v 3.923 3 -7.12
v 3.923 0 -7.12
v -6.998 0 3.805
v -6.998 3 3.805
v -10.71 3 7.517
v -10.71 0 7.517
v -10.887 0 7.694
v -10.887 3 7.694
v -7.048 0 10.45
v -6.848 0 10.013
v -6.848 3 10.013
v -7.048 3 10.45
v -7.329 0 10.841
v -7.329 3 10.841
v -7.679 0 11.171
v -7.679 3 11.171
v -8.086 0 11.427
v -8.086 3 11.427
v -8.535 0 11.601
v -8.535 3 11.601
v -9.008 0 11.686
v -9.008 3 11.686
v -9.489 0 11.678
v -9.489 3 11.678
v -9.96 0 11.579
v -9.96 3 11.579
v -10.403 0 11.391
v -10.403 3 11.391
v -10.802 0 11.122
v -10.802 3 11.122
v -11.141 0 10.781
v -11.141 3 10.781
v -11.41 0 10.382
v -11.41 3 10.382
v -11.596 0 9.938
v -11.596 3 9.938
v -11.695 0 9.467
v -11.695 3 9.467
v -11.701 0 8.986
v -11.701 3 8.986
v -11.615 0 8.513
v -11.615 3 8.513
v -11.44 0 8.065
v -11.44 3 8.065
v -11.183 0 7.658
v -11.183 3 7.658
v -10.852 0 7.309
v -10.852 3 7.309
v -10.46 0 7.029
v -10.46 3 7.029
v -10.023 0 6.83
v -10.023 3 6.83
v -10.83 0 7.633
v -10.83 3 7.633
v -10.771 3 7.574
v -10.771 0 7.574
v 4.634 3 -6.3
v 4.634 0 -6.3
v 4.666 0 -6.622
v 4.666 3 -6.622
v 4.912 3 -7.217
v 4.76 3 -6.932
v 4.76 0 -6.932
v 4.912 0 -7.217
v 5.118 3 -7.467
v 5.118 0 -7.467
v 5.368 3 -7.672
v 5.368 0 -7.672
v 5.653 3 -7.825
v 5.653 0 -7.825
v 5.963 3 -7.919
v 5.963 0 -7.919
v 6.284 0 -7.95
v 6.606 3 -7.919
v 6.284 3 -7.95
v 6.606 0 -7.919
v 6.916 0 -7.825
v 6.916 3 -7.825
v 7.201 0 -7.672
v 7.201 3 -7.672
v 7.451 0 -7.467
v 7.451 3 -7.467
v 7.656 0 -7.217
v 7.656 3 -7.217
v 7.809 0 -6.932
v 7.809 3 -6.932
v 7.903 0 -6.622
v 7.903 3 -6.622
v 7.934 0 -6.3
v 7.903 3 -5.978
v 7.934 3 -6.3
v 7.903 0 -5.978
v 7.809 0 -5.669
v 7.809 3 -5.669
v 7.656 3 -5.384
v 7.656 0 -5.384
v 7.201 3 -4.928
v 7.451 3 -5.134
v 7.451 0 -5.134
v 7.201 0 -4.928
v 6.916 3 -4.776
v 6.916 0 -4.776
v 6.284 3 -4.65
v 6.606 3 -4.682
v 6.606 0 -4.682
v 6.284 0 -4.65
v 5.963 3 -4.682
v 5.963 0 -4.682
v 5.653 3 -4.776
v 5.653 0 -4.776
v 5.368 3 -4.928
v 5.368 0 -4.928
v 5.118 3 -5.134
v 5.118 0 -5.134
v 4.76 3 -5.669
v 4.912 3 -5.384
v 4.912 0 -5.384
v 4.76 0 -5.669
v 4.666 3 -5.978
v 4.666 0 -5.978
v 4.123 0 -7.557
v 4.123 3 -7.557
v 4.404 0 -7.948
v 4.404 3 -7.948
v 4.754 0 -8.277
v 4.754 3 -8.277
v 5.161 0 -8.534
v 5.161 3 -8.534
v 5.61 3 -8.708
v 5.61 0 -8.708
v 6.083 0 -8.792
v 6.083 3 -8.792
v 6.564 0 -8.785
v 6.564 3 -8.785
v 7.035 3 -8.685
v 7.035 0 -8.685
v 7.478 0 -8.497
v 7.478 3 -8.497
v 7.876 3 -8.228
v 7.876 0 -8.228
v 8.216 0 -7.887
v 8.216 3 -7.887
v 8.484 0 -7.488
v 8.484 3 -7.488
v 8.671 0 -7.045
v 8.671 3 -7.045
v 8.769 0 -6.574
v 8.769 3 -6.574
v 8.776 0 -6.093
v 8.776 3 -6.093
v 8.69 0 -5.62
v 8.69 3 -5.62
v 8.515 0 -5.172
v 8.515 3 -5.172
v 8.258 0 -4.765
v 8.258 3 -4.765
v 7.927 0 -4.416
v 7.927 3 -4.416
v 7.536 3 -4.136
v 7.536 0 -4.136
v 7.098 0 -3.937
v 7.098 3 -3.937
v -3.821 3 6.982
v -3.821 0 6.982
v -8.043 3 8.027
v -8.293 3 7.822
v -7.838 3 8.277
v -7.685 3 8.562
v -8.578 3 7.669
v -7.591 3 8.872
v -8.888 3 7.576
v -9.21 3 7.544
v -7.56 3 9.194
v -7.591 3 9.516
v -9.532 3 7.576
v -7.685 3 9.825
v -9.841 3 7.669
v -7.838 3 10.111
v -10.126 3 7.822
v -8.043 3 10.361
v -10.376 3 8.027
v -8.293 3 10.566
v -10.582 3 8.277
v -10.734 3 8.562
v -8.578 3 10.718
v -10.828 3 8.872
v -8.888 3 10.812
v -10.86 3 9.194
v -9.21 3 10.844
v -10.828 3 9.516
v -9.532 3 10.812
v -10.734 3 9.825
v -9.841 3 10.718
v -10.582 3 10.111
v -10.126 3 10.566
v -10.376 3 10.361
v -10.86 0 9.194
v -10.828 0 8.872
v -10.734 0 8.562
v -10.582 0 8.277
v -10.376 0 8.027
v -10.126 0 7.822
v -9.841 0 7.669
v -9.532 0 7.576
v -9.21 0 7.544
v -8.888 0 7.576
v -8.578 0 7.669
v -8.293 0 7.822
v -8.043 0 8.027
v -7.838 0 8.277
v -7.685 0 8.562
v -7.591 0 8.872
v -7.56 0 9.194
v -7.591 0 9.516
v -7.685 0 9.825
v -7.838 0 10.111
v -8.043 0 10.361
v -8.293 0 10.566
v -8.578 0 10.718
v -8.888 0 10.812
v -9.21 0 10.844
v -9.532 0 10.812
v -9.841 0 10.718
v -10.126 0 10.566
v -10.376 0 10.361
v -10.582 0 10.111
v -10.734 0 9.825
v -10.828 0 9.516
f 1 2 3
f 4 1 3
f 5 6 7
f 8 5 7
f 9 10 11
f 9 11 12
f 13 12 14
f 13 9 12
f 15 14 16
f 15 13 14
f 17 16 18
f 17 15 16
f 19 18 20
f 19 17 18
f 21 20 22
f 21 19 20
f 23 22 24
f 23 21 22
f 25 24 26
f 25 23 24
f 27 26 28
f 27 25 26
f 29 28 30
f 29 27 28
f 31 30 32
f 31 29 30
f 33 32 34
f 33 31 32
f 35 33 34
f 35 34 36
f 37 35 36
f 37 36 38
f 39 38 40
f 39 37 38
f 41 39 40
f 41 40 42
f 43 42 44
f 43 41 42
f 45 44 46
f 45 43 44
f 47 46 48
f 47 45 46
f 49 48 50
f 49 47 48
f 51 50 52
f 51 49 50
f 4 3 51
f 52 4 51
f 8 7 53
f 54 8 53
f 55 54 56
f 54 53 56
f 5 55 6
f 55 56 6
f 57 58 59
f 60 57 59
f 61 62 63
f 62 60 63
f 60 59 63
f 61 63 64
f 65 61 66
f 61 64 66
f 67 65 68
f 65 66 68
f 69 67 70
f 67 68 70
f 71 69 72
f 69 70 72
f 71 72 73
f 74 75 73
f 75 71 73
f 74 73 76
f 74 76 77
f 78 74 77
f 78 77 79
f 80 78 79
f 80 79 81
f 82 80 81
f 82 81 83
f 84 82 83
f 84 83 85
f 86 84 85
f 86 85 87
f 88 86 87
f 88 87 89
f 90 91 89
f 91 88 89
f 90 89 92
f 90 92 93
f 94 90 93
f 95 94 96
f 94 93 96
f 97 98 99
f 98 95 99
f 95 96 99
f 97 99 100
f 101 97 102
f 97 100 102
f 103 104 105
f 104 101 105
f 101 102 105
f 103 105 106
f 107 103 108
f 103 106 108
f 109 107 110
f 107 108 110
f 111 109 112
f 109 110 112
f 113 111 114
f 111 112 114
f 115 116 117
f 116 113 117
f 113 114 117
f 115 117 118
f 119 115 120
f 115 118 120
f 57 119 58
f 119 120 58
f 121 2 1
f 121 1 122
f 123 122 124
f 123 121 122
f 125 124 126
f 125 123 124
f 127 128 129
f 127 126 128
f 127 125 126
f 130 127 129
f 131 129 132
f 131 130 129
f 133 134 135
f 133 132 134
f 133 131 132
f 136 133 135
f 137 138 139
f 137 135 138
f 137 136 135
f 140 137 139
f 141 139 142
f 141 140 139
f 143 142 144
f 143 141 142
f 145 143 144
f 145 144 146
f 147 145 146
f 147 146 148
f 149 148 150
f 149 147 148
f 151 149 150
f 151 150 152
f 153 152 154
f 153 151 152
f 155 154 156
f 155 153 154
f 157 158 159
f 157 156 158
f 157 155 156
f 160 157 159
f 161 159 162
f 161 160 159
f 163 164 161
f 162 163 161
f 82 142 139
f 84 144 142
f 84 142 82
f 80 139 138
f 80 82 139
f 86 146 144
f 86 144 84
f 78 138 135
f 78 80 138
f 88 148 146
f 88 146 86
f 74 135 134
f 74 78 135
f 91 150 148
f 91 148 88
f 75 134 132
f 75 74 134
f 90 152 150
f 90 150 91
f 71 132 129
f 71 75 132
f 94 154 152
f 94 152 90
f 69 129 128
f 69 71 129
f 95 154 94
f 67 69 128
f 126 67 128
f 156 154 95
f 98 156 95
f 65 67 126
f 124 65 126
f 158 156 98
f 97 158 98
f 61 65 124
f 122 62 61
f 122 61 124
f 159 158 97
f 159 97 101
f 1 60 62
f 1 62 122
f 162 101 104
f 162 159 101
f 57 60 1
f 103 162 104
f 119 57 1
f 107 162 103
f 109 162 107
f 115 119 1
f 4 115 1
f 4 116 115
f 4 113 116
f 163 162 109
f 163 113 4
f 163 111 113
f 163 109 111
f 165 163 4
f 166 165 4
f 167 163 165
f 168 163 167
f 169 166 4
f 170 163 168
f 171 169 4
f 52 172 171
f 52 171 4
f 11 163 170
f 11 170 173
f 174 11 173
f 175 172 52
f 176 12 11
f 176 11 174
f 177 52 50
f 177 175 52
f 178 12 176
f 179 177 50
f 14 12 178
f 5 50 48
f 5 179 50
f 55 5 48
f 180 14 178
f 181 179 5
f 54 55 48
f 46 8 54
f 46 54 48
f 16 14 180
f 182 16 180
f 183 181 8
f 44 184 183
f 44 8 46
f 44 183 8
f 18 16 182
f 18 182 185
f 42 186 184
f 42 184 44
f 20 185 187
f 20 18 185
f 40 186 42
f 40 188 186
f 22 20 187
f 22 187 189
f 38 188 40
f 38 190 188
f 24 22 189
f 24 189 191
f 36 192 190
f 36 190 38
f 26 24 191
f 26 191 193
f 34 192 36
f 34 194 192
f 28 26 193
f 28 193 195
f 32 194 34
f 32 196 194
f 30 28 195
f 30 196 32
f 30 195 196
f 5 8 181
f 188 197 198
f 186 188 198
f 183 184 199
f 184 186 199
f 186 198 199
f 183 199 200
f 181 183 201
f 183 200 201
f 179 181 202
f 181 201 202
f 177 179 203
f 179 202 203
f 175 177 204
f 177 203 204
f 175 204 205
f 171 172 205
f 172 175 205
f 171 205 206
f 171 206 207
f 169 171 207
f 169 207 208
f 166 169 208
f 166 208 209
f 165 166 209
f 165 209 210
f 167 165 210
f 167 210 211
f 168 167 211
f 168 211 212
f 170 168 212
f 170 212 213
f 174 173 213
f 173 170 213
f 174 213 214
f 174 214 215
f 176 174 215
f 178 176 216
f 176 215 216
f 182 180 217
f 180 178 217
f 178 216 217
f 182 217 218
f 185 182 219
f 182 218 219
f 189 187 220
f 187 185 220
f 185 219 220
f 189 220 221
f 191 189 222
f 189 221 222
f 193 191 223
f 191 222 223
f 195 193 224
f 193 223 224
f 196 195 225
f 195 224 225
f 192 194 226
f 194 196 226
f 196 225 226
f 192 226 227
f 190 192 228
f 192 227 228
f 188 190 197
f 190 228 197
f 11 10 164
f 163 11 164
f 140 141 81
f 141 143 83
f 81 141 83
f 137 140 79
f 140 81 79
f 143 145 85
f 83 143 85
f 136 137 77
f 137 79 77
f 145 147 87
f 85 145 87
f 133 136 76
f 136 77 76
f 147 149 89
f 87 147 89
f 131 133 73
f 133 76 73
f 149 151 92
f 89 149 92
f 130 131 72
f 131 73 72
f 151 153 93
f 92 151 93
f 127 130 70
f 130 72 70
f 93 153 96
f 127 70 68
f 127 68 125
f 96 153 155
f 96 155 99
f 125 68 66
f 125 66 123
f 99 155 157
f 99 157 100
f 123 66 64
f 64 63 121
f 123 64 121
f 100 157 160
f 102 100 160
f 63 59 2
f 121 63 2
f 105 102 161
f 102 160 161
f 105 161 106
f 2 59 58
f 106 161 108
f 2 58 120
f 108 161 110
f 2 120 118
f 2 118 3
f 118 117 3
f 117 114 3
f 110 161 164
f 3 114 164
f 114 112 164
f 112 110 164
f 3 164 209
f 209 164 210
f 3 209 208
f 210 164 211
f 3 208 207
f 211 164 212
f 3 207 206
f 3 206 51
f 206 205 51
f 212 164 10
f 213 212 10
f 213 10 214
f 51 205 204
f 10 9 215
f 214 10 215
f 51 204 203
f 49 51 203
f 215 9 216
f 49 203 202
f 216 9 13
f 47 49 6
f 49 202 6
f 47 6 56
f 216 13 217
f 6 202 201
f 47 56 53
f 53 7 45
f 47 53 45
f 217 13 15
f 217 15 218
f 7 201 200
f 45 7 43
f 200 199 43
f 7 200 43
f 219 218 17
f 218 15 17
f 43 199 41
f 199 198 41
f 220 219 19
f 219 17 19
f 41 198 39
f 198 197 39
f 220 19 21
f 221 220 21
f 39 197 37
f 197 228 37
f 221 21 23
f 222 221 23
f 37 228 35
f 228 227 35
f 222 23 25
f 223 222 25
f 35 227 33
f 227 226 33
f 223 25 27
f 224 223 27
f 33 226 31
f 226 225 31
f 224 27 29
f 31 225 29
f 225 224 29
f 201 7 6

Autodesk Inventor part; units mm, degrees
ref_plane "YZ Plane" through (0, 0, 0) normal (1, 0, 0) x (0, 1, 0)
ref_plane "XZ Plane" through (0, 0, 0) normal (0, 1, 0) x (-1, 0, 0)
ref_plane "XY Plane" through (0, 0, 0) normal (0, 0, 1) x (1, 0, 0)
sketch "Sketch1" plane through (0, 0, 0) normal (0, 1, 0) x (-1, 0, 0)
  arc A0 (-7.7903, -4.6284) -> (-4.6931, -7.8909) centre (-6.2844, -6.3003) ccw
  arc A1 (-7.7903, -4.6284) -> (-4.6931, -7.8909) centre (-6.2844, -6.3003) ccw
  circle A2 centre (9.2097, 9.1939) radius 1.65
  circle A3 centre (-6.2844, -6.3003) radius 1.65
  arc A4 (-7.7903, -4.6284) -> (-4.6931, -7.8909) centre (-6.2844, -6.3003) ccw
  line L0 (3.8206, 6.9818) -> (-7.7903, -4.6284)
  line L1 (7.2787, 10.4444) -> (3.8206, 6.9818)
  arc A5 (7.3269, 10.4258) -> (7.2787, 10.4444) centre (5.3206, 5.3048) ccw
  arc A6 (10.8867, 7.6938) -> (7.3269, 10.4258) centre (9.2097, 9.1939) ccw
  line L2 (10.7098, 7.5169) -> (10.8867, 7.6938)
  arc A7 (10.4416, 7.3111) -> (10.7098, 7.5169) centre (9.2097, 9.1939) ccw
  arc A8 (10.459, 7.2661) -> (10.4416, 7.3111) centre (5.3206, 5.3048) ccw
  line L3 (6.9976, 3.8047) -> (10.459, 7.2661)
  line L4 (-4.6931, -7.8909) -> (6.9976, 3.8047)
  circle A9 centre (-6.2844, -6.3003) radius 1.75
  arc A10 (-7.7903, -4.6284) -> (-4.6931, -7.8909) centre (-6.2844, -6.3003) ccw
  line L5 (-4.6931, -7.8909) -> (6.9976, 3.8047)
  line L6 (6.9976, 3.8047) -> (10.459, 7.2661)
  arc A11 (10.459, 7.2661) -> (10.4416, 7.3111) centre (5.3206, 5.3048) ccw
  arc A12 (10.4416, 7.3111) -> (10.7098, 7.5169) centre (9.2097, 9.1939) ccw
  line L7 (10.7098, 7.5169) -> (10.8867, 7.6938)
  arc A13 (10.8867, 7.6938) -> (7.3269, 10.4258) centre (9.2097, 9.1939) ccw
  arc A14 (7.3269, 10.4258) -> (7.2787, 10.4444) centre (5.3206, 5.3048) ccw
  line L8 (7.2787, 10.4444) -> (3.8206, 6.9818)
  line L9 (3.8206, 6.9818) -> (-7.7903, -4.6284)
  line L10 (3.8206, 6.9818) -> (-7.7903, -4.6284)
  line L11 (3.8206, 6.9818) -> (-7.7903, -4.6284)
  line L12 (3.8206, 6.9818) -> (-7.7903, -4.6284)
  line L13 (3.8206, 6.9818) -> (-7.7903, -4.6284)
  line L14 (-4.6931, -7.8909) -> (6.9976, 3.8047)
  line L15 (-4.6931, -7.8909) -> (6.9976, 3.8047)
  line L16 (-4.6931, -7.8909) -> (6.9976, 3.8047)
  line L17 (-4.6931, -7.8909) -> (6.9976, 3.8047)
  circle A15 centre (-6.2844, -6.3003) radius 1.75
  circle A16 centre (-6.2844, -6.3003) radius 1.75
  circle A17 centre (-6.2844, -6.3003) radius 1.75
  circle A18 centre (-6.2844, -6.3003) radius 1.75
  arc A19 (-7.7903, -4.6284) -> (-4.6931, -7.8909) centre (-6.2844, -6.3003) ccw
  arc A20 (-7.7903, -4.6284) -> (-4.6931, -7.8909) centre (-6.2844, -6.3003) ccw
  line L18 (7.2787, 10.4444) -> (3.8206, 6.9818)
  line L19 (7.2787, 10.4444) -> (3.8206, 6.9818)
  line L20 (7.2787, 10.4444) -> (3.8206, 6.9818)
  line L21 (7.2787, 10.4444) -> (3.8206, 6.9818)
  line L22 (6.9976, 3.8047) -> (10.459, 7.2661)
  line L23 (6.9976, 3.8047) -> (10.459, 7.2661)
  line L24 (6.9976, 3.8047) -> (10.459, 7.2661)
  line L25 (6.9976, 3.8047) -> (10.459, 7.2661)
  arc A21 (7.3269, 10.4258) -> (7.2787, 10.4444) centre (5.3206, 5.3048) ccw
  arc A22 (7.3269, 10.4258) -> (7.2787, 10.4444) centre (5.3206, 5.3048) ccw
  arc A23 (10.459, 7.2661) -> (10.4416, 7.3111) centre (5.3206, 5.3048) ccw
  arc A24 (10.459, 7.2661) -> (10.4416, 7.3111) centre (5.3206, 5.3048) ccw
  arc A25 (10.459, 7.2661) -> (10.4416, 7.3111) centre (5.3206, 5.3048) ccw
  arc A26 (10.459, 7.2661) -> (10.4416, 7.3111) centre (5.3206, 5.3048) ccw
  arc A27 (10.4416, 7.3111) -> (10.7098, 7.5169) centre (9.2097, 9.1939) ccw
  arc A28 (10.4416, 7.3111) -> (10.7098, 7.5169) centre (9.2097, 9.1939) ccw
  arc A29 (10.4416, 7.3111) -> (10.7098, 7.5169) centre (9.2097, 9.1939) ccw
  arc A30 (10.4416, 7.3111) -> (10.7098, 7.5169) centre (9.2097, 9.1939) ccw
  line L26 (10.7098, 7.5169) -> (10.8867, 7.6938)
  line L27 (10.7098, 7.5169) -> (10.8867, 7.6938)
  arc A31 (7.3269, 10.4258) -> (7.2787, 10.4444) centre (5.3206, 5.3048) ccw
  line L28 (10.7098, 7.5169) -> (10.8867, 7.6938)
  arc A32 (10.8867, 7.6938) -> (7.3269, 10.4258) centre (9.2097, 9.1939) ccw
  arc A33 (10.8867, 7.6938) -> (7.3269, 10.4258) centre (9.2097, 9.1939) ccw
  arc A34 (10.8867, 7.6938) -> (7.3269, 10.4258) centre (9.2097, 9.1939) ccw
  arc A35 (10.8867, 7.6938) -> (7.3269, 10.4258) centre (9.2097, 9.1939) ccw
  line L29 (10.7098, 7.5169) -> (10.8867, 7.6938)
  circle A36 centre (9.2097, 9.1939) radius 1.75
  arc A37 (7.3269, 10.4258) -> (7.2787, 10.4444) centre (5.3206, 5.3048) ccw
  circle A38 centre (-6.2844, -6.3003) radius 1.75
  circle A39 centre (-6.2844, -6.3003) radius 2.5
  circle A40 centre (9.2097, 9.1939) radius 2.5
  circle A41 centre (-6.2844, -6.3003) radius 2.5
  circle A42 centre (9.2097, 9.1939) radius 2.25
  point P0 (0, 0)
  point P1 (-12.3012, -12.317)
  point P2 (10.0226, 6.8297)
  point P3 (6.8476, 10.0128)
  point P4 (-7.0982, -3.9364)
  point P5 (-3.9227, -7.1202)
  dimension "d0" = 5
  dimension "d1" = 5
  dimension "d4" = 3.3
  dimension "d5" = 3.3
extrude "Extrusion1" add sketch "Sketch1" along normal blind 3 contours L0 A39 L4 A0 | A0 L4 A39 L0 | L0 L1 A40 L3 L4 A39 | A40 L3 A8 A7 A42 A6 A5 L1 | L1 A5 A42 A8 L3 A40 | A6 L2 A7 A42 | A9 | A36
properties part number "LINKV2"
